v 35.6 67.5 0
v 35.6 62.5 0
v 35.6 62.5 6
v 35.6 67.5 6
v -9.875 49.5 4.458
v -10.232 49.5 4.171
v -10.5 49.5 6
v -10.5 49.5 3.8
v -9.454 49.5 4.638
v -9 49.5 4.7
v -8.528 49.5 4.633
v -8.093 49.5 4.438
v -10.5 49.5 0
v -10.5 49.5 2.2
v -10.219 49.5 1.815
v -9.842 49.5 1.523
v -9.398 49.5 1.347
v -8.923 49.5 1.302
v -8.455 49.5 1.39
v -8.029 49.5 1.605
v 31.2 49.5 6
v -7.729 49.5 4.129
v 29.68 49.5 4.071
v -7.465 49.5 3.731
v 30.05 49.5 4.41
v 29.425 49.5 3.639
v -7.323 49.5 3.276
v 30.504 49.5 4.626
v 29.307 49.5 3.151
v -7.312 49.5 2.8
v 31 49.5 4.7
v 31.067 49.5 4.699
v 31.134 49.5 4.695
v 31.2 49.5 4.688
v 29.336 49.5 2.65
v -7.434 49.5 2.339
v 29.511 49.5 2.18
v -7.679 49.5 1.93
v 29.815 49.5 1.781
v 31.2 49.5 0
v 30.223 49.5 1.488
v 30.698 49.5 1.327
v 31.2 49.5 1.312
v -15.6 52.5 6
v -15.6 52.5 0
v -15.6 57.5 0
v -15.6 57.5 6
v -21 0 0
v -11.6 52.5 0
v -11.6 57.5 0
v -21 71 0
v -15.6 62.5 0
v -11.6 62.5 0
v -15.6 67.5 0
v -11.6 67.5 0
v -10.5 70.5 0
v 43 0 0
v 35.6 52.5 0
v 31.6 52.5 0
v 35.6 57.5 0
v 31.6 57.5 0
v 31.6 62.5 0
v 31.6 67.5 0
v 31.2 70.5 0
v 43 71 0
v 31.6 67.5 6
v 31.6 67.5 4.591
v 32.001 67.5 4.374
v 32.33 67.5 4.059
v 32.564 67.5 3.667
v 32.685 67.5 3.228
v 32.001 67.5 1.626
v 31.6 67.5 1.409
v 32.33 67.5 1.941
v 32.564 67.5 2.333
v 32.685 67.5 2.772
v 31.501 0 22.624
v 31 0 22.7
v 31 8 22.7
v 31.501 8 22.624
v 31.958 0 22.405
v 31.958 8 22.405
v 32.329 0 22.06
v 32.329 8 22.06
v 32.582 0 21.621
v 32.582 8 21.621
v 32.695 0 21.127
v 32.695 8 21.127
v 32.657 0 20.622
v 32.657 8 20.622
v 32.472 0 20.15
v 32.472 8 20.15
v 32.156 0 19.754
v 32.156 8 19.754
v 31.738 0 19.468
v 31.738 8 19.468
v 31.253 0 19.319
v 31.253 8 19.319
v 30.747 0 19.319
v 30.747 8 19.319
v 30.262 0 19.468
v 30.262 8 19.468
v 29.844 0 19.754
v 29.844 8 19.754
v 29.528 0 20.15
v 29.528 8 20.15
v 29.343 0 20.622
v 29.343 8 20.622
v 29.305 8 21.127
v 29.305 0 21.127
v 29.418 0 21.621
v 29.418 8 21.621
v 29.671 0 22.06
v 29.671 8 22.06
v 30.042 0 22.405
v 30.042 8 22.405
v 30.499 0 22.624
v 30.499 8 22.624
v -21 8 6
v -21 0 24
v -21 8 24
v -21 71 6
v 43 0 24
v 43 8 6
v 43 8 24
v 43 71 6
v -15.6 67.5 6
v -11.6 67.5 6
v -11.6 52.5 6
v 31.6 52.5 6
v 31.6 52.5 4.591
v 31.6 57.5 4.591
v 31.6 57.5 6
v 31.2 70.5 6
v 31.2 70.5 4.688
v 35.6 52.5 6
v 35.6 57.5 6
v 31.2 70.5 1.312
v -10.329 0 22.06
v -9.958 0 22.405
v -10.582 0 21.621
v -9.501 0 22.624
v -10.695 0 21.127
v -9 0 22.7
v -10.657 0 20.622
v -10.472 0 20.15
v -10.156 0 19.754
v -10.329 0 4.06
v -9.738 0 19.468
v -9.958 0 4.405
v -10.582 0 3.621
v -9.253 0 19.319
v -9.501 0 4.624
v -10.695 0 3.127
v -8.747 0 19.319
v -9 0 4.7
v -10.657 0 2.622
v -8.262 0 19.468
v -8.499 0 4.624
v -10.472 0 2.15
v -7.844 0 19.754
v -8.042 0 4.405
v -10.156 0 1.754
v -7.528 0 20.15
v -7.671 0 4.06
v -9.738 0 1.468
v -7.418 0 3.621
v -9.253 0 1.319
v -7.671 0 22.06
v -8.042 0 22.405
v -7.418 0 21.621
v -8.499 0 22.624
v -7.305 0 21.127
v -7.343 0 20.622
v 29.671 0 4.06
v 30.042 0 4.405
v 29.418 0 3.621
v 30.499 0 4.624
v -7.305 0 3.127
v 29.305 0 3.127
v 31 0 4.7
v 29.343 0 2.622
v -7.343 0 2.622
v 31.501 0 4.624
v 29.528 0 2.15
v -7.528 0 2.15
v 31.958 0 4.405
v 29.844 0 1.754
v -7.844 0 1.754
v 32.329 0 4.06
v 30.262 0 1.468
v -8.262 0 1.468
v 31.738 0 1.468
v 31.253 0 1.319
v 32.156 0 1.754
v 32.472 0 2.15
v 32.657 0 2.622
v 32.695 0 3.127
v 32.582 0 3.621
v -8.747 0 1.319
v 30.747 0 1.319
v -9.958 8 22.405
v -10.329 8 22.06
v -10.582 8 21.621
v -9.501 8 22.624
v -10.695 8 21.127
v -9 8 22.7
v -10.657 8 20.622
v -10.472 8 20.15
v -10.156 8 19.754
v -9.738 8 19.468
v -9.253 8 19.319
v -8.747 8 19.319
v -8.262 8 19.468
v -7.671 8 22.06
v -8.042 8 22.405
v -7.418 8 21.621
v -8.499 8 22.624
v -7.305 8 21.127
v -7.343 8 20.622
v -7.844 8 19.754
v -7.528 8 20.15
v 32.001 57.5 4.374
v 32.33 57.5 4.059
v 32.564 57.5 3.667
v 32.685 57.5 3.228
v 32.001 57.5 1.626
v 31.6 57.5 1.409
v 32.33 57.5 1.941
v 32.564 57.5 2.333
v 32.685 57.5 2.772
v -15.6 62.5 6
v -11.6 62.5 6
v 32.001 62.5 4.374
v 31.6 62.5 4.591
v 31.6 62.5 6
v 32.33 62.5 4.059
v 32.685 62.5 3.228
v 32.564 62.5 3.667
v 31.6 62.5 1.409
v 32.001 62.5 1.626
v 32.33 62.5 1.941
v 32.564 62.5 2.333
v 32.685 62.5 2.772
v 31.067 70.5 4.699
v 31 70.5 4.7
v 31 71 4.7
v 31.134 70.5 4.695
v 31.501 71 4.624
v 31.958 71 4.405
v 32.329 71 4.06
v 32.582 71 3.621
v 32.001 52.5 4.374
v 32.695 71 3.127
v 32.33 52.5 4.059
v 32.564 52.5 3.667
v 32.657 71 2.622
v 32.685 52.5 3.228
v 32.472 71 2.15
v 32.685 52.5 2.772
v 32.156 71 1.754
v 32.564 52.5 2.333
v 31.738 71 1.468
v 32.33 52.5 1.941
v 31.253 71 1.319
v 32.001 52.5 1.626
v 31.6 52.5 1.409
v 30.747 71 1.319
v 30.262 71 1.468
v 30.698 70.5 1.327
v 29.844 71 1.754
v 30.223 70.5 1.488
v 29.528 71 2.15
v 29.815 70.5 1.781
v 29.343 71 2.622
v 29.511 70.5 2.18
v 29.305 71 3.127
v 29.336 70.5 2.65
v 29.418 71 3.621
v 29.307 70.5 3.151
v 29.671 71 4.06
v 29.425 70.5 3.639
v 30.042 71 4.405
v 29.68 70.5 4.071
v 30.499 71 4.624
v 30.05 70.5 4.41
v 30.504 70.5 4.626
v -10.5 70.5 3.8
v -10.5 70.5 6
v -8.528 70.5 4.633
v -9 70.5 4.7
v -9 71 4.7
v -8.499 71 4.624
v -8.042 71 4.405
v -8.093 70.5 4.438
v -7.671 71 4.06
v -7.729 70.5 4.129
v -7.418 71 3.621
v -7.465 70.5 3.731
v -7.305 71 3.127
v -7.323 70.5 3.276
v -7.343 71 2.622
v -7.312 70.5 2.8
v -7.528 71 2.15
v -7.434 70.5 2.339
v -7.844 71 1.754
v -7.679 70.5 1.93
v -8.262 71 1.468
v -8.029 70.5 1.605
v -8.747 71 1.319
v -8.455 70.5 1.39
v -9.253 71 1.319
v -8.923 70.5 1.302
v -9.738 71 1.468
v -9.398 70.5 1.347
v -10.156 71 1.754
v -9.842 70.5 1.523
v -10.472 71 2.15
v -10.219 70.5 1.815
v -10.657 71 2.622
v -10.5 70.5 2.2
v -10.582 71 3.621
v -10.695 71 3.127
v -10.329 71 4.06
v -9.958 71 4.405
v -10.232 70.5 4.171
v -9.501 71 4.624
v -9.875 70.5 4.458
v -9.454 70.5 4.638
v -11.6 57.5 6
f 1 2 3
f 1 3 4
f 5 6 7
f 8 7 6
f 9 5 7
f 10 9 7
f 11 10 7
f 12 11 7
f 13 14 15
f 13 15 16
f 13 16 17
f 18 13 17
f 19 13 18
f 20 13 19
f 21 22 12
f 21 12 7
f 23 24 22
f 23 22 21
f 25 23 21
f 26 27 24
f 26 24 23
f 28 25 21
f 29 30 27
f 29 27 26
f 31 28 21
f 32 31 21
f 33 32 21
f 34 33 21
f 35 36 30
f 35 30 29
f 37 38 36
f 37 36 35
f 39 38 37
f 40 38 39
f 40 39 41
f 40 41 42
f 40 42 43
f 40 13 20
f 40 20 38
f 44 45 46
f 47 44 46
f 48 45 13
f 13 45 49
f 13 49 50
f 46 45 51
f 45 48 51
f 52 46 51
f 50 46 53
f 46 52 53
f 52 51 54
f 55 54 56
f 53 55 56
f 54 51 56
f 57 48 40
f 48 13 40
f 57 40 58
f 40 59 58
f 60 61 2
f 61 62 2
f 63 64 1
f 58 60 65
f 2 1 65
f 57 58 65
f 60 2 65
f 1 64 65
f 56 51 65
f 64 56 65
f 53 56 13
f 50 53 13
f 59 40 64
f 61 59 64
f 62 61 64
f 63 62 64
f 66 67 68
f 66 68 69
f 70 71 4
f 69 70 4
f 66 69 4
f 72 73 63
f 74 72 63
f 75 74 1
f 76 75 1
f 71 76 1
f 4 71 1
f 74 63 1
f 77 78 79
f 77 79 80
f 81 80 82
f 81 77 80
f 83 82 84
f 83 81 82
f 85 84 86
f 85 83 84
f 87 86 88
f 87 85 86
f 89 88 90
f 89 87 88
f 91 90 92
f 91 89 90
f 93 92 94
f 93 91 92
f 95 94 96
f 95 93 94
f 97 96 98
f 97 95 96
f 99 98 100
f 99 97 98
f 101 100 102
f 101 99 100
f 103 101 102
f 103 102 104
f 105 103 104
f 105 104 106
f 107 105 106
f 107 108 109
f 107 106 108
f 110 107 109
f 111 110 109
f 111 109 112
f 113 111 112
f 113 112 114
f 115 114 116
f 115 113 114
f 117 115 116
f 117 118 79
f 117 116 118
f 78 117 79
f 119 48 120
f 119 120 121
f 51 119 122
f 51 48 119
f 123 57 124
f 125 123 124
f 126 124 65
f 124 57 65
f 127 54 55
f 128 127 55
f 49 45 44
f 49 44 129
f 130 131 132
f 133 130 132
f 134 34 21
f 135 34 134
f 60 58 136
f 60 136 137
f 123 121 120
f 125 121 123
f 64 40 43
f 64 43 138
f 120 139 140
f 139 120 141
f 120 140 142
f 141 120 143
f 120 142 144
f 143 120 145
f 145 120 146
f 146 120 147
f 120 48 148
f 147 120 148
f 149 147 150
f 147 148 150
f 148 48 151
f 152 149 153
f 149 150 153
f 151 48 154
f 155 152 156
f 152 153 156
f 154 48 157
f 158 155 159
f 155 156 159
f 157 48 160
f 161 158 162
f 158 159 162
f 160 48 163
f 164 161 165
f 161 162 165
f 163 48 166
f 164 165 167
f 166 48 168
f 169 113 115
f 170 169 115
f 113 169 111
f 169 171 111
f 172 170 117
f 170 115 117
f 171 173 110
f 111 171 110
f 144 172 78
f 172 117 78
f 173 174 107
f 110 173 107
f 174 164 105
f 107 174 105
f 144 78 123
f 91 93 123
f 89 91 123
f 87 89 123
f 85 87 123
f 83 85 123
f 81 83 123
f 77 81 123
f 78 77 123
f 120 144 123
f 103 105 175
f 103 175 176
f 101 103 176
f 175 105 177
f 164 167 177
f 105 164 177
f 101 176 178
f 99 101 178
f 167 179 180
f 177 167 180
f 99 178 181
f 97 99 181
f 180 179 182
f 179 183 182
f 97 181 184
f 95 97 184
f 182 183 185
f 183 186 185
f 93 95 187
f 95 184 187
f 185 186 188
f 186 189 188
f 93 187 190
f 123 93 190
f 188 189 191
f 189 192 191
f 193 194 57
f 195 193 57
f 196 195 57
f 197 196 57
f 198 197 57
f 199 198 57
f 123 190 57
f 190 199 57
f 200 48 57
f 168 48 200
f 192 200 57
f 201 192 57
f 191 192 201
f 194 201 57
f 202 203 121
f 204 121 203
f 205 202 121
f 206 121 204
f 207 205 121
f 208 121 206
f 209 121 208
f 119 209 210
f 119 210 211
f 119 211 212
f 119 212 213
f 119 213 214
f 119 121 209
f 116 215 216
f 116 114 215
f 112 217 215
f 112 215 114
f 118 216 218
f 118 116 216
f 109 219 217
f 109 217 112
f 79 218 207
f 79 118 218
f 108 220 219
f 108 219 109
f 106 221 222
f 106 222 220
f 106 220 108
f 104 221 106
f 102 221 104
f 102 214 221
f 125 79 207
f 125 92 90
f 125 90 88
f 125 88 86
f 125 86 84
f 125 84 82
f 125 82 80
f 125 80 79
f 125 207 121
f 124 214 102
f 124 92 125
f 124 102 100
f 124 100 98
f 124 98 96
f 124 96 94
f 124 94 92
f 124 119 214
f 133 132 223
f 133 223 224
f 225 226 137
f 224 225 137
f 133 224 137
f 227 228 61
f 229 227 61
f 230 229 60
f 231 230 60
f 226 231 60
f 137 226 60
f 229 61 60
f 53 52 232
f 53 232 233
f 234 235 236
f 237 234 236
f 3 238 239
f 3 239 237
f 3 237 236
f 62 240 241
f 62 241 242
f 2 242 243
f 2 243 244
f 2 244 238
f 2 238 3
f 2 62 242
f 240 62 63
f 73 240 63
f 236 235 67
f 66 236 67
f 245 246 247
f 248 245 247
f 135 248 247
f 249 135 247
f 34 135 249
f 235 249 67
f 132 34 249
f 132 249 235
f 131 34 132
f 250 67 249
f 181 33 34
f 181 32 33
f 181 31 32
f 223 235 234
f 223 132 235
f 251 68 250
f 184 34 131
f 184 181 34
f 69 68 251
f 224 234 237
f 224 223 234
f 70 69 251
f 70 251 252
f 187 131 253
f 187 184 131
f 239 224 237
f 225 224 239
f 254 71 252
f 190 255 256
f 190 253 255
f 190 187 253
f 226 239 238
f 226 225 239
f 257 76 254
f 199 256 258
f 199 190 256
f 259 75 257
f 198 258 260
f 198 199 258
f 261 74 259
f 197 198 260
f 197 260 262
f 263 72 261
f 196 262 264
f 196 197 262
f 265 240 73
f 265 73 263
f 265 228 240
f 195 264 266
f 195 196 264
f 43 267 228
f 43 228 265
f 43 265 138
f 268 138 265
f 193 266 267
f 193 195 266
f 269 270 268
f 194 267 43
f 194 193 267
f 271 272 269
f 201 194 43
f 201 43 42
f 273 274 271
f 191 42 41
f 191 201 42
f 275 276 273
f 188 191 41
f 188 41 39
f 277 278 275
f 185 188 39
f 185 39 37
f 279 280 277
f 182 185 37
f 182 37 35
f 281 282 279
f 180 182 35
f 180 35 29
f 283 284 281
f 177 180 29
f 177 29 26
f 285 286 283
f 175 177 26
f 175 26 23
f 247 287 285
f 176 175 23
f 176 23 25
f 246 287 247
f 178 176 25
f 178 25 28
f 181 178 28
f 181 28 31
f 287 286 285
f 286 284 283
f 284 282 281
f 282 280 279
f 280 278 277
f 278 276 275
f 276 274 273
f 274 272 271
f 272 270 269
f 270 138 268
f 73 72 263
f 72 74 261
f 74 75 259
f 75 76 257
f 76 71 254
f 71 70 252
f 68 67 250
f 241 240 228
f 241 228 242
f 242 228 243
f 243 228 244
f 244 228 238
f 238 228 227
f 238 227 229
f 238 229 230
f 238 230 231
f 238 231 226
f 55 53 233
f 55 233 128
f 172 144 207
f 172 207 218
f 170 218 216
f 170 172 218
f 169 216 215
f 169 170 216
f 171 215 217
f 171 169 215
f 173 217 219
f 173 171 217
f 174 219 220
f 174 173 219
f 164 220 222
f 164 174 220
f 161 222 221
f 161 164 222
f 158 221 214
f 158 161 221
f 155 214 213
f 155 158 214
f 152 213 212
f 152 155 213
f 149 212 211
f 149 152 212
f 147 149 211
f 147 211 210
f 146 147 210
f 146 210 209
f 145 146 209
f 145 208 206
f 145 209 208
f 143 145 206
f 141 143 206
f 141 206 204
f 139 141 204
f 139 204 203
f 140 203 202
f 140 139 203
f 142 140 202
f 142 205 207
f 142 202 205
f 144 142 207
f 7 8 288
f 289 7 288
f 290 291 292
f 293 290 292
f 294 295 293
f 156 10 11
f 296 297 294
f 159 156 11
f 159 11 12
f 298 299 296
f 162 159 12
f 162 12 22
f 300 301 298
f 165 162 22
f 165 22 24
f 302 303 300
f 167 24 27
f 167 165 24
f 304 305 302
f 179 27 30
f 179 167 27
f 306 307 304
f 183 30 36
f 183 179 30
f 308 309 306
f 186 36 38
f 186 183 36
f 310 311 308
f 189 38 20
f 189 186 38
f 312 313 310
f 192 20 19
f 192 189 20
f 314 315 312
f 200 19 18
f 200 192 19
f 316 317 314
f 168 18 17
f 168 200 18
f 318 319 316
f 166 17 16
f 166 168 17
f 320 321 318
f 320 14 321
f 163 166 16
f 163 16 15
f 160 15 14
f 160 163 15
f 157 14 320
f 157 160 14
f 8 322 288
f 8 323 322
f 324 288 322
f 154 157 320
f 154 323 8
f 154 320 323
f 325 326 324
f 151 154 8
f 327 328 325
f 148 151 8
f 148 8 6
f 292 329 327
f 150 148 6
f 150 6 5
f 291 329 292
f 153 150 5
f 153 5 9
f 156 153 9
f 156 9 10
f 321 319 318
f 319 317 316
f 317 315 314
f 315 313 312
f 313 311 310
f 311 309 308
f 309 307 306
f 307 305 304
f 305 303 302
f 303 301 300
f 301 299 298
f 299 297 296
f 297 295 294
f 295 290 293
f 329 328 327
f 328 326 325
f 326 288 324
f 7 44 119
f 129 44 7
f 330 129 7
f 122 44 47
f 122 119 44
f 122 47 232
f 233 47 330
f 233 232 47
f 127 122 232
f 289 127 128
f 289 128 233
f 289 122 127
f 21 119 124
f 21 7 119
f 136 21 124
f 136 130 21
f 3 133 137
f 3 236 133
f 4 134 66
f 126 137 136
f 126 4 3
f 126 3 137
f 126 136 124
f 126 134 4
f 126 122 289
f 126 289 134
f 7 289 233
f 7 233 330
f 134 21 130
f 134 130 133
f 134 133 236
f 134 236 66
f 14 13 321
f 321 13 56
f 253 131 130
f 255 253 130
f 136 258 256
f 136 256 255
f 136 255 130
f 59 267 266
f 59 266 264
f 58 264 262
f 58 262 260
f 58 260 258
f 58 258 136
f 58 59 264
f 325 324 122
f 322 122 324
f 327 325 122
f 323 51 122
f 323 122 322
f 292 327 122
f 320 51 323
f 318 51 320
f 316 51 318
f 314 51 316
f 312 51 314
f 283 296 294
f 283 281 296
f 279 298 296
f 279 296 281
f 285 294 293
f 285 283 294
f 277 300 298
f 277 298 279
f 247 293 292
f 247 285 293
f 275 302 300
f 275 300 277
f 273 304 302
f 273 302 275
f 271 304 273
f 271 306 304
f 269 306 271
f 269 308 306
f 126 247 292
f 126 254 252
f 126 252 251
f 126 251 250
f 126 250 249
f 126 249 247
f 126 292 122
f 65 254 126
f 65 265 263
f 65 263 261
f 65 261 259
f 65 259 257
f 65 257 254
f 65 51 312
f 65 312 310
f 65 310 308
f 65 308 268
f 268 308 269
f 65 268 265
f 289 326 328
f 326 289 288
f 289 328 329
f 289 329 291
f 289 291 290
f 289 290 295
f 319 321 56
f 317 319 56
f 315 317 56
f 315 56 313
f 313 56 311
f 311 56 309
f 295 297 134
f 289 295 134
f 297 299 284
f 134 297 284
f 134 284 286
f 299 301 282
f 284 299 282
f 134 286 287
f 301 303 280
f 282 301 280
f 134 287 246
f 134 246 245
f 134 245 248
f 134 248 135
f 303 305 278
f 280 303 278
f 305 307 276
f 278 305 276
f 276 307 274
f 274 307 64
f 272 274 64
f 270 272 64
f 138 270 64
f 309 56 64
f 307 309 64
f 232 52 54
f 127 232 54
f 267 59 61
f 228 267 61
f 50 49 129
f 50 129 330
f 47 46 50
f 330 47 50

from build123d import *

# Parameters (mm, degrees)
SKETCH_1_W                                      = 64
SKETCH_1_H                                      = 8
SERVO_FOOT_DEPTH                                = 24
SKETCH_2_W                                      = 64
SKETCH_2_H                                      = 71
SERVO_FACE_PLATE_DEPTH                          = 6
MG995_BODY_WINDOW_REFERENCE_DEPTH               = 87.406018309
MG995_BODY_WINDOW_REFERENCE_DEPTH_BACK          = 87.406018309
SKETCH_3_W                                      = 41.7
SKETCH_3_H                                      = 21
MG995_47P2X10_REFERENCE_SLOTS_VERIFY_DEPTH      = 87.406018309
MG995_47P2X10_REFERENCE_SLOTS_VERIFY_DEPTH_BACK = 87.406018309
SKETCH_4_W                                      = 4
SKETCH_4_H                                      = 5
SERVO_FOOT_M3_DEPTH                             = 87.406018309
SERVO_FOOT_M3_DEPTH_BACK                        = 87.406018309
SKETCH_5_R                                      = 1.7


with BuildPart() as part:
    # 草图1 → Servo_foot (new body)
    with BuildSketch(Plane.XY):
        with Locations((11, 4)):
            Rectangle(SKETCH_1_W, SKETCH_1_H)
    extrude(amount=SERVO_FOOT_DEPTH)

    # 草图2 → Servo_face_plate (add)
    with BuildSketch(Plane.XY):
        with Locations((11, 35.5)):
            Rectangle(SKETCH_2_W, SKETCH_2_H)
    extrude(amount=SERVO_FACE_PLATE_DEPTH)

    # 草图3 → MG995_body_window_REFERENCE (cut, two sides: drawn at the far end of the back side and taken through both)
    with BuildSketch(Plane.XY.offset(-MG995_BODY_WINDOW_REFERENCE_DEPTH_BACK)):
        with Locations((10.35, 60)):
            Rectangle(SKETCH_3_W, SKETCH_3_H)
    extrude(amount=MG995_BODY_WINDOW_REFERENCE_DEPTH + MG995_BODY_WINDOW_REFERENCE_DEPTH_BACK, mode=Mode.SUBTRACT)

    # 草图4 → MG995_47p2x10_reference_slots_VERIFY (cut, two sides: drawn at the far end of the back side and taken through both)
    with BuildSketch(Plane.XY.offset(-MG995_47P2X10_REFERENCE_SLOTS_VERIFY_DEPTH_BACK)):
        with Locations((-13.6, 55)):
            Rectangle(SKETCH_4_W, SKETCH_4_H)
        with Locations((-13.6, 65)):
            Rectangle(SKETCH_4_W, SKETCH_4_H)
        with Locations((33.6, 55)):
            Rectangle(SKETCH_4_W, SKETCH_4_H)
        with Locations((33.6, 65)):
            Rectangle(SKETCH_4_W, SKETCH_4_H)
    extrude(amount=MG995_47P2X10_REFERENCE_SLOTS_VERIFY_DEPTH + MG995_47P2X10_REFERENCE_SLOTS_VERIFY_DEPTH_BACK, mode=Mode.SUBTRACT)

    # 草图5 → Servo_foot_M3 (cut, two sides: drawn at the far end of the back side and taken through both)
    with BuildSketch(Plane(origin=(0, 0, 0), x_dir=(1, 0, 0), z_dir=(0, 1, 0)).offset(-SERVO_FOOT_M3_DEPTH_BACK)):
        with Locations(Location((-9, -3, 0), (0, 0, 270))):
            Circle(SKETCH_5_R)
        with Locations(Location((-9, -21, 0), (0, 0, 270))):
            Circle(SKETCH_5_R)
        with Locations(Location((31, -3, 0), (0, 0, 270))):
            Circle(SKETCH_5_R)
        with Locations(Location((31, -21, 0), (0, 0, 270))):
            Circle(SKETCH_5_R)
    extrude(amount=SERVO_FOOT_M3_DEPTH + SERVO_FOOT_M3_DEPTH_BACK, mode=Mode.SUBTRACT)


solid = part.part
